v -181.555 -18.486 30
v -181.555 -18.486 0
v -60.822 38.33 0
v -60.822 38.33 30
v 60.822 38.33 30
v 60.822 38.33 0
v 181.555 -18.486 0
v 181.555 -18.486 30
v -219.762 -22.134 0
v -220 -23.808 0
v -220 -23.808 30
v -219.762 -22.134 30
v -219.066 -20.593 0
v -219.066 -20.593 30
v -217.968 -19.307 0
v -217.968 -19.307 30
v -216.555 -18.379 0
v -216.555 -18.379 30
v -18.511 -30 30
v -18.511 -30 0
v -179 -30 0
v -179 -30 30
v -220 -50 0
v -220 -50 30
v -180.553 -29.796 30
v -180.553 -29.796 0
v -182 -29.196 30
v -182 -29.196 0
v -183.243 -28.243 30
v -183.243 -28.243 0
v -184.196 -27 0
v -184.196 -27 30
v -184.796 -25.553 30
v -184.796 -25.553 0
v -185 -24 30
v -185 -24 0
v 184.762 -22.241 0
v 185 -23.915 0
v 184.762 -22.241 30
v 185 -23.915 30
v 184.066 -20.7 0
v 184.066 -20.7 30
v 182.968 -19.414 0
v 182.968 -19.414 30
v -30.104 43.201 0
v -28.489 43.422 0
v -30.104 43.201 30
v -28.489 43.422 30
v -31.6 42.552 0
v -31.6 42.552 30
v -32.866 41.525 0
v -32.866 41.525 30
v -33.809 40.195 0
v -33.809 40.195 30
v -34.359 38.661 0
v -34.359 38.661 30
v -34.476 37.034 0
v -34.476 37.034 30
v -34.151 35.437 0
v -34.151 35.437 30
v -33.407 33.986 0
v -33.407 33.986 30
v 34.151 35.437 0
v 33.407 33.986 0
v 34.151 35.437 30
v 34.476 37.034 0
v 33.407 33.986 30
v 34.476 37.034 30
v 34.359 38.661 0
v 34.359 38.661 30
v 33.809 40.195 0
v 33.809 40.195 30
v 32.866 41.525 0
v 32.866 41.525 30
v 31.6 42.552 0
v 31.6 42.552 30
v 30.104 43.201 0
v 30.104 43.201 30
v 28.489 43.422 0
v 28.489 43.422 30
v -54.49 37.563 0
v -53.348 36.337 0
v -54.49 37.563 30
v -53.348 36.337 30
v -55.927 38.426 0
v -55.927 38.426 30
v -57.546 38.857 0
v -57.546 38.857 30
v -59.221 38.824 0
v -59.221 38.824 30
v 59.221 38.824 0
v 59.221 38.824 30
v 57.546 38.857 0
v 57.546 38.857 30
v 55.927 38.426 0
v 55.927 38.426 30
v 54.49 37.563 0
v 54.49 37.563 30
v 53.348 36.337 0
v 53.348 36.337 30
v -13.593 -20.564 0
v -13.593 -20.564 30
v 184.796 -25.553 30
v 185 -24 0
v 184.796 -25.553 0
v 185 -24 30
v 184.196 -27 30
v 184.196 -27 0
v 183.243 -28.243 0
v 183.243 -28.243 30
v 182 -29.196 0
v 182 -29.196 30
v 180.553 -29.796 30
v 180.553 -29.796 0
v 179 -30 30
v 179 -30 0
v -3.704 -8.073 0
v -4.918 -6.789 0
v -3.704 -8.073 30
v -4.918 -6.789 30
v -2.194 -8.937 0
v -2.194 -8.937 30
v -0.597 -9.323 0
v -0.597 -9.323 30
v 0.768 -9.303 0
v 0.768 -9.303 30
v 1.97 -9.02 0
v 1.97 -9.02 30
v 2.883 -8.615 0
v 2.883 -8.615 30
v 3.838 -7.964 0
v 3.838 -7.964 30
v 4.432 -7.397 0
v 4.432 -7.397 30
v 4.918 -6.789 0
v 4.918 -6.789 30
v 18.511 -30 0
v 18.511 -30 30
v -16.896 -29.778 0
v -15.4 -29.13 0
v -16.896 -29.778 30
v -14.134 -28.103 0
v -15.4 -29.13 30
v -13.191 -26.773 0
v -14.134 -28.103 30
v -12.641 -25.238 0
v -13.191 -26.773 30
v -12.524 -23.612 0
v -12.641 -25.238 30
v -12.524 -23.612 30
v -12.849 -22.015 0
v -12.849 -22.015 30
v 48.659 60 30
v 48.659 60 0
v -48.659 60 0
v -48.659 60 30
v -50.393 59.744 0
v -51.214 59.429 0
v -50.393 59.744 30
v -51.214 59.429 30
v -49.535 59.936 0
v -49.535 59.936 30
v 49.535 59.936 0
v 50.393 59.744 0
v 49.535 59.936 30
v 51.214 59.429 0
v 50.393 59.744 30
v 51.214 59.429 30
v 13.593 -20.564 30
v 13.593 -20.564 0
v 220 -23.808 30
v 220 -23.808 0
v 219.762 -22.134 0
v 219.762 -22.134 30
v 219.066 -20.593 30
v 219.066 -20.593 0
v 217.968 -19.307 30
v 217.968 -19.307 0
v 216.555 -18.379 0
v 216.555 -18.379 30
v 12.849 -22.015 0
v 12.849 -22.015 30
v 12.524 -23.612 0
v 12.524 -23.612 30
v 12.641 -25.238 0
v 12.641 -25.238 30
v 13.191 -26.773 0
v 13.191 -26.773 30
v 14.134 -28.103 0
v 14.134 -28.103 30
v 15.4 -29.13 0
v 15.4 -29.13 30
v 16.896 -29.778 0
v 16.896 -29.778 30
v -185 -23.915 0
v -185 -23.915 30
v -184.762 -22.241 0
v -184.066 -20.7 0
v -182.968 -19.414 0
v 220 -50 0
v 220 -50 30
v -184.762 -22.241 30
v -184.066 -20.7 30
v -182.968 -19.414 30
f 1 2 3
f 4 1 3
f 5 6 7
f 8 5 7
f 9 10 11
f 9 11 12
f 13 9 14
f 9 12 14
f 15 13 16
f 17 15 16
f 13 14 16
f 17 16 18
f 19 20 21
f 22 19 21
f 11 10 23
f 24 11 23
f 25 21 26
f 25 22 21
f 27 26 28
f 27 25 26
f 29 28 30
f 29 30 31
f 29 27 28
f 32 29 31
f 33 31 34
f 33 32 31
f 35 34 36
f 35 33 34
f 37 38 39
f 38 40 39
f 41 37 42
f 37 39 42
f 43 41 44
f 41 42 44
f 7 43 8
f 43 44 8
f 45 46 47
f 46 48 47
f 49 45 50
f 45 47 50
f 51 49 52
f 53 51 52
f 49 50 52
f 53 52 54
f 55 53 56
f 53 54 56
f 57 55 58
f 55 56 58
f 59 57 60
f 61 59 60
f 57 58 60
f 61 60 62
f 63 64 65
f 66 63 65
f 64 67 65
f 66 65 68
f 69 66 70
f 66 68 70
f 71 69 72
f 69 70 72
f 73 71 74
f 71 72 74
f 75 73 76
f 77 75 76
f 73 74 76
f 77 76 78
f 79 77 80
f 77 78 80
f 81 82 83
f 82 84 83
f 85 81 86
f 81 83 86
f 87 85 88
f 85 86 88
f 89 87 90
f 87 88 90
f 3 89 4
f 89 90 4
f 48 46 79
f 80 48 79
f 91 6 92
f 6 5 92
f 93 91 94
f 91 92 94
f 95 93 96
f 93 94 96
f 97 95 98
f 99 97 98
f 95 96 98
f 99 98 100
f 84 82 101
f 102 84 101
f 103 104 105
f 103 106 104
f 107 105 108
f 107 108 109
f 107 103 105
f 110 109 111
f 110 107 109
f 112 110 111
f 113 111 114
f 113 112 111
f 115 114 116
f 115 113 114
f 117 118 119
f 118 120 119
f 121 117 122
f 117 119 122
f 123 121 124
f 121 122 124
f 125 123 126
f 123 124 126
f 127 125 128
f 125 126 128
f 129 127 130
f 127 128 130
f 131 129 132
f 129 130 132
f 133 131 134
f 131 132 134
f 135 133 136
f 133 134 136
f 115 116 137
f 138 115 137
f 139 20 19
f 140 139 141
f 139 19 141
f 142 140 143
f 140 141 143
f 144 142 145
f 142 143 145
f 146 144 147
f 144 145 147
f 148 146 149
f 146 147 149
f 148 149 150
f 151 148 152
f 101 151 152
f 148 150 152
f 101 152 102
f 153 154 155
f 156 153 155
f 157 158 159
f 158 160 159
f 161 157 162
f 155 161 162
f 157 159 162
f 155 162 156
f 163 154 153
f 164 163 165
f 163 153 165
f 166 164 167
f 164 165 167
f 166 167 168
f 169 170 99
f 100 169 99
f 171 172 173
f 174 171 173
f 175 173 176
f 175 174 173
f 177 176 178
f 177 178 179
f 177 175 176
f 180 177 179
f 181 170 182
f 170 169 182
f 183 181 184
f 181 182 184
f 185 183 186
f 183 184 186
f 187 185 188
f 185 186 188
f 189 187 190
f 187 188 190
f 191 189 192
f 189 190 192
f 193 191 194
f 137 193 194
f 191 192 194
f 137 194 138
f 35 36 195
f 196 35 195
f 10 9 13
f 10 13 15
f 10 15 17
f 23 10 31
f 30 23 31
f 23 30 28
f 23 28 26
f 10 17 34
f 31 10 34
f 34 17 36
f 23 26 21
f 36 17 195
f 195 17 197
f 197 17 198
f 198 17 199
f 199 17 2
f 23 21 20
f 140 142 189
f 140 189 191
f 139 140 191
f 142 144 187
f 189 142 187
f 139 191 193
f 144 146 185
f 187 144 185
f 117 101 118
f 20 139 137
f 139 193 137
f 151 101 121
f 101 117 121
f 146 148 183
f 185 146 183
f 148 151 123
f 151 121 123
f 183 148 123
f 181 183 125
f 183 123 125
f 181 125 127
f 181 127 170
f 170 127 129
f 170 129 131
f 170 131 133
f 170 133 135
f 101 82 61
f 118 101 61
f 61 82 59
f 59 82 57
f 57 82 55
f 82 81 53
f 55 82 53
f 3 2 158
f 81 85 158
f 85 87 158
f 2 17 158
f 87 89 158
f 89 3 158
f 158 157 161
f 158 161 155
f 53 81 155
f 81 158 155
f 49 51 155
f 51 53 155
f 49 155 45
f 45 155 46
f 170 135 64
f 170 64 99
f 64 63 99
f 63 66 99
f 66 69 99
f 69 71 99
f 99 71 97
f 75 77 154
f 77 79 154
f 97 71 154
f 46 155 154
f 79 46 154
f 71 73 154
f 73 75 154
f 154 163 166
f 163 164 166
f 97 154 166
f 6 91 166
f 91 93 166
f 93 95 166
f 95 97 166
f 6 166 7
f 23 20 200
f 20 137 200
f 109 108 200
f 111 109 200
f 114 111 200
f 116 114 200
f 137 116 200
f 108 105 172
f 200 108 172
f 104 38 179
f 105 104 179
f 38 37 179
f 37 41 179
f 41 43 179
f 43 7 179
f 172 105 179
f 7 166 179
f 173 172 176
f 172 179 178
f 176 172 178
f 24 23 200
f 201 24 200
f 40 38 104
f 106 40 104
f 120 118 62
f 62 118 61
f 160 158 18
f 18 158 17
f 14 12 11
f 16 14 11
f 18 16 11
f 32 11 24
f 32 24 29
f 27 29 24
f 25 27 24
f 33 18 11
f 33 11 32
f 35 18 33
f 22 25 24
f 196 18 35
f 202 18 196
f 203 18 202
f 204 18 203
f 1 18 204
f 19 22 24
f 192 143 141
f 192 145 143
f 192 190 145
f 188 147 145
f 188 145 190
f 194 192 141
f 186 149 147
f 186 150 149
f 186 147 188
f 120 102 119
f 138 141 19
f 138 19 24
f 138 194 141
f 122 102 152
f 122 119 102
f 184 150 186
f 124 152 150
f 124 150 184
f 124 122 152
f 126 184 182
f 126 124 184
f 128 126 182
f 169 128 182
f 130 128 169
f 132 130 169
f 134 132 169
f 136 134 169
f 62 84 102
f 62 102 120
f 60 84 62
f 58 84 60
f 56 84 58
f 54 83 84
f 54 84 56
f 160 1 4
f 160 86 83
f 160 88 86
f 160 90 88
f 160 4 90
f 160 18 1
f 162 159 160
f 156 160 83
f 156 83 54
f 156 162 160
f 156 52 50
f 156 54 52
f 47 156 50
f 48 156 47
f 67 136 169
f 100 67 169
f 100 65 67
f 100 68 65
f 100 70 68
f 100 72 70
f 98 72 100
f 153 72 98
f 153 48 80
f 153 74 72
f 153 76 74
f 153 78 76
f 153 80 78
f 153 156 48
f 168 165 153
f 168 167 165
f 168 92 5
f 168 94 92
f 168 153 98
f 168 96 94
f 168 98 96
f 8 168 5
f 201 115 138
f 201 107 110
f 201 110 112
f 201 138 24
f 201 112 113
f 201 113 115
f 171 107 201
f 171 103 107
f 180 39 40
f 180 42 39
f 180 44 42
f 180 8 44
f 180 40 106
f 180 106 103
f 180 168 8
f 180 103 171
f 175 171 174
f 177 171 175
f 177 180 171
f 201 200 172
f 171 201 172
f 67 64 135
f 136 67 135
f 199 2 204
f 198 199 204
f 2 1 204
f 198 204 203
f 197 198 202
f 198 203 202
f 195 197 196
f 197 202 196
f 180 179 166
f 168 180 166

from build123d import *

# Parameters (mm, degrees)
F1_DEPTH = 30
F3_DEPTH = 30.001
F4_R     = 6


with BuildPart() as f1:
    # F0 (on Top) → F1 (new body)
    with BuildSketch(Plane.XY):
        Polygon((-220, -20), (-220, -50), (220, -50), (220, -20), (50, 60), (-50, 60), align=None)
    extrude(amount=F1_DEPTH)

    # F2 (on face) → F3 (cut, through all)
    with BuildSketch(Plane(origin=(0, 0, 0), x_dir=(1, 0, 0), z_dir=(0, 0, -1))):
        Polygon((-185, 30), (-185, 20.1073184365), (-56.2451380356, -40.4832048408), (-7, 30), align=None)
        Polygon((-1.2777449276, 12), (-40, -43.4220933282), (40, -43.4220933282), (1.2777449276, 12), (0, 13.8288009955), align=None)
        Polygon((185, 30), (7, 30), (56.2451380356, -40.4832048408), (185, 20.1073184365), align=None)
    extrude(amount=-F3_DEPTH, mode=Mode.SUBTRACT)

    # F4
    f4_edges = [f1.edges().sort_by_distance(p)[0] for p in [
        (-185, -20.107318, 15),
        (-185, -30, 15),
        (185, -20.107318, 15),
        (185, -30, 15),
        (-50, 60, 15),
        (50, 60, 15),
        (220, -20, 15),
        (-220, -20, 15),
        (-7, -30, 15),
        (7, -30, 15),
        (0, -13.828801, 15),
        (-56.245138, 40.483205, 15),
        (56.245138, 40.483205, 15),
        (40, 43.422093, 15),
        (-40, 43.422093, 15),
    ]]
    fillet(f4_edges, radius=F4_R)


solid = f1.part
